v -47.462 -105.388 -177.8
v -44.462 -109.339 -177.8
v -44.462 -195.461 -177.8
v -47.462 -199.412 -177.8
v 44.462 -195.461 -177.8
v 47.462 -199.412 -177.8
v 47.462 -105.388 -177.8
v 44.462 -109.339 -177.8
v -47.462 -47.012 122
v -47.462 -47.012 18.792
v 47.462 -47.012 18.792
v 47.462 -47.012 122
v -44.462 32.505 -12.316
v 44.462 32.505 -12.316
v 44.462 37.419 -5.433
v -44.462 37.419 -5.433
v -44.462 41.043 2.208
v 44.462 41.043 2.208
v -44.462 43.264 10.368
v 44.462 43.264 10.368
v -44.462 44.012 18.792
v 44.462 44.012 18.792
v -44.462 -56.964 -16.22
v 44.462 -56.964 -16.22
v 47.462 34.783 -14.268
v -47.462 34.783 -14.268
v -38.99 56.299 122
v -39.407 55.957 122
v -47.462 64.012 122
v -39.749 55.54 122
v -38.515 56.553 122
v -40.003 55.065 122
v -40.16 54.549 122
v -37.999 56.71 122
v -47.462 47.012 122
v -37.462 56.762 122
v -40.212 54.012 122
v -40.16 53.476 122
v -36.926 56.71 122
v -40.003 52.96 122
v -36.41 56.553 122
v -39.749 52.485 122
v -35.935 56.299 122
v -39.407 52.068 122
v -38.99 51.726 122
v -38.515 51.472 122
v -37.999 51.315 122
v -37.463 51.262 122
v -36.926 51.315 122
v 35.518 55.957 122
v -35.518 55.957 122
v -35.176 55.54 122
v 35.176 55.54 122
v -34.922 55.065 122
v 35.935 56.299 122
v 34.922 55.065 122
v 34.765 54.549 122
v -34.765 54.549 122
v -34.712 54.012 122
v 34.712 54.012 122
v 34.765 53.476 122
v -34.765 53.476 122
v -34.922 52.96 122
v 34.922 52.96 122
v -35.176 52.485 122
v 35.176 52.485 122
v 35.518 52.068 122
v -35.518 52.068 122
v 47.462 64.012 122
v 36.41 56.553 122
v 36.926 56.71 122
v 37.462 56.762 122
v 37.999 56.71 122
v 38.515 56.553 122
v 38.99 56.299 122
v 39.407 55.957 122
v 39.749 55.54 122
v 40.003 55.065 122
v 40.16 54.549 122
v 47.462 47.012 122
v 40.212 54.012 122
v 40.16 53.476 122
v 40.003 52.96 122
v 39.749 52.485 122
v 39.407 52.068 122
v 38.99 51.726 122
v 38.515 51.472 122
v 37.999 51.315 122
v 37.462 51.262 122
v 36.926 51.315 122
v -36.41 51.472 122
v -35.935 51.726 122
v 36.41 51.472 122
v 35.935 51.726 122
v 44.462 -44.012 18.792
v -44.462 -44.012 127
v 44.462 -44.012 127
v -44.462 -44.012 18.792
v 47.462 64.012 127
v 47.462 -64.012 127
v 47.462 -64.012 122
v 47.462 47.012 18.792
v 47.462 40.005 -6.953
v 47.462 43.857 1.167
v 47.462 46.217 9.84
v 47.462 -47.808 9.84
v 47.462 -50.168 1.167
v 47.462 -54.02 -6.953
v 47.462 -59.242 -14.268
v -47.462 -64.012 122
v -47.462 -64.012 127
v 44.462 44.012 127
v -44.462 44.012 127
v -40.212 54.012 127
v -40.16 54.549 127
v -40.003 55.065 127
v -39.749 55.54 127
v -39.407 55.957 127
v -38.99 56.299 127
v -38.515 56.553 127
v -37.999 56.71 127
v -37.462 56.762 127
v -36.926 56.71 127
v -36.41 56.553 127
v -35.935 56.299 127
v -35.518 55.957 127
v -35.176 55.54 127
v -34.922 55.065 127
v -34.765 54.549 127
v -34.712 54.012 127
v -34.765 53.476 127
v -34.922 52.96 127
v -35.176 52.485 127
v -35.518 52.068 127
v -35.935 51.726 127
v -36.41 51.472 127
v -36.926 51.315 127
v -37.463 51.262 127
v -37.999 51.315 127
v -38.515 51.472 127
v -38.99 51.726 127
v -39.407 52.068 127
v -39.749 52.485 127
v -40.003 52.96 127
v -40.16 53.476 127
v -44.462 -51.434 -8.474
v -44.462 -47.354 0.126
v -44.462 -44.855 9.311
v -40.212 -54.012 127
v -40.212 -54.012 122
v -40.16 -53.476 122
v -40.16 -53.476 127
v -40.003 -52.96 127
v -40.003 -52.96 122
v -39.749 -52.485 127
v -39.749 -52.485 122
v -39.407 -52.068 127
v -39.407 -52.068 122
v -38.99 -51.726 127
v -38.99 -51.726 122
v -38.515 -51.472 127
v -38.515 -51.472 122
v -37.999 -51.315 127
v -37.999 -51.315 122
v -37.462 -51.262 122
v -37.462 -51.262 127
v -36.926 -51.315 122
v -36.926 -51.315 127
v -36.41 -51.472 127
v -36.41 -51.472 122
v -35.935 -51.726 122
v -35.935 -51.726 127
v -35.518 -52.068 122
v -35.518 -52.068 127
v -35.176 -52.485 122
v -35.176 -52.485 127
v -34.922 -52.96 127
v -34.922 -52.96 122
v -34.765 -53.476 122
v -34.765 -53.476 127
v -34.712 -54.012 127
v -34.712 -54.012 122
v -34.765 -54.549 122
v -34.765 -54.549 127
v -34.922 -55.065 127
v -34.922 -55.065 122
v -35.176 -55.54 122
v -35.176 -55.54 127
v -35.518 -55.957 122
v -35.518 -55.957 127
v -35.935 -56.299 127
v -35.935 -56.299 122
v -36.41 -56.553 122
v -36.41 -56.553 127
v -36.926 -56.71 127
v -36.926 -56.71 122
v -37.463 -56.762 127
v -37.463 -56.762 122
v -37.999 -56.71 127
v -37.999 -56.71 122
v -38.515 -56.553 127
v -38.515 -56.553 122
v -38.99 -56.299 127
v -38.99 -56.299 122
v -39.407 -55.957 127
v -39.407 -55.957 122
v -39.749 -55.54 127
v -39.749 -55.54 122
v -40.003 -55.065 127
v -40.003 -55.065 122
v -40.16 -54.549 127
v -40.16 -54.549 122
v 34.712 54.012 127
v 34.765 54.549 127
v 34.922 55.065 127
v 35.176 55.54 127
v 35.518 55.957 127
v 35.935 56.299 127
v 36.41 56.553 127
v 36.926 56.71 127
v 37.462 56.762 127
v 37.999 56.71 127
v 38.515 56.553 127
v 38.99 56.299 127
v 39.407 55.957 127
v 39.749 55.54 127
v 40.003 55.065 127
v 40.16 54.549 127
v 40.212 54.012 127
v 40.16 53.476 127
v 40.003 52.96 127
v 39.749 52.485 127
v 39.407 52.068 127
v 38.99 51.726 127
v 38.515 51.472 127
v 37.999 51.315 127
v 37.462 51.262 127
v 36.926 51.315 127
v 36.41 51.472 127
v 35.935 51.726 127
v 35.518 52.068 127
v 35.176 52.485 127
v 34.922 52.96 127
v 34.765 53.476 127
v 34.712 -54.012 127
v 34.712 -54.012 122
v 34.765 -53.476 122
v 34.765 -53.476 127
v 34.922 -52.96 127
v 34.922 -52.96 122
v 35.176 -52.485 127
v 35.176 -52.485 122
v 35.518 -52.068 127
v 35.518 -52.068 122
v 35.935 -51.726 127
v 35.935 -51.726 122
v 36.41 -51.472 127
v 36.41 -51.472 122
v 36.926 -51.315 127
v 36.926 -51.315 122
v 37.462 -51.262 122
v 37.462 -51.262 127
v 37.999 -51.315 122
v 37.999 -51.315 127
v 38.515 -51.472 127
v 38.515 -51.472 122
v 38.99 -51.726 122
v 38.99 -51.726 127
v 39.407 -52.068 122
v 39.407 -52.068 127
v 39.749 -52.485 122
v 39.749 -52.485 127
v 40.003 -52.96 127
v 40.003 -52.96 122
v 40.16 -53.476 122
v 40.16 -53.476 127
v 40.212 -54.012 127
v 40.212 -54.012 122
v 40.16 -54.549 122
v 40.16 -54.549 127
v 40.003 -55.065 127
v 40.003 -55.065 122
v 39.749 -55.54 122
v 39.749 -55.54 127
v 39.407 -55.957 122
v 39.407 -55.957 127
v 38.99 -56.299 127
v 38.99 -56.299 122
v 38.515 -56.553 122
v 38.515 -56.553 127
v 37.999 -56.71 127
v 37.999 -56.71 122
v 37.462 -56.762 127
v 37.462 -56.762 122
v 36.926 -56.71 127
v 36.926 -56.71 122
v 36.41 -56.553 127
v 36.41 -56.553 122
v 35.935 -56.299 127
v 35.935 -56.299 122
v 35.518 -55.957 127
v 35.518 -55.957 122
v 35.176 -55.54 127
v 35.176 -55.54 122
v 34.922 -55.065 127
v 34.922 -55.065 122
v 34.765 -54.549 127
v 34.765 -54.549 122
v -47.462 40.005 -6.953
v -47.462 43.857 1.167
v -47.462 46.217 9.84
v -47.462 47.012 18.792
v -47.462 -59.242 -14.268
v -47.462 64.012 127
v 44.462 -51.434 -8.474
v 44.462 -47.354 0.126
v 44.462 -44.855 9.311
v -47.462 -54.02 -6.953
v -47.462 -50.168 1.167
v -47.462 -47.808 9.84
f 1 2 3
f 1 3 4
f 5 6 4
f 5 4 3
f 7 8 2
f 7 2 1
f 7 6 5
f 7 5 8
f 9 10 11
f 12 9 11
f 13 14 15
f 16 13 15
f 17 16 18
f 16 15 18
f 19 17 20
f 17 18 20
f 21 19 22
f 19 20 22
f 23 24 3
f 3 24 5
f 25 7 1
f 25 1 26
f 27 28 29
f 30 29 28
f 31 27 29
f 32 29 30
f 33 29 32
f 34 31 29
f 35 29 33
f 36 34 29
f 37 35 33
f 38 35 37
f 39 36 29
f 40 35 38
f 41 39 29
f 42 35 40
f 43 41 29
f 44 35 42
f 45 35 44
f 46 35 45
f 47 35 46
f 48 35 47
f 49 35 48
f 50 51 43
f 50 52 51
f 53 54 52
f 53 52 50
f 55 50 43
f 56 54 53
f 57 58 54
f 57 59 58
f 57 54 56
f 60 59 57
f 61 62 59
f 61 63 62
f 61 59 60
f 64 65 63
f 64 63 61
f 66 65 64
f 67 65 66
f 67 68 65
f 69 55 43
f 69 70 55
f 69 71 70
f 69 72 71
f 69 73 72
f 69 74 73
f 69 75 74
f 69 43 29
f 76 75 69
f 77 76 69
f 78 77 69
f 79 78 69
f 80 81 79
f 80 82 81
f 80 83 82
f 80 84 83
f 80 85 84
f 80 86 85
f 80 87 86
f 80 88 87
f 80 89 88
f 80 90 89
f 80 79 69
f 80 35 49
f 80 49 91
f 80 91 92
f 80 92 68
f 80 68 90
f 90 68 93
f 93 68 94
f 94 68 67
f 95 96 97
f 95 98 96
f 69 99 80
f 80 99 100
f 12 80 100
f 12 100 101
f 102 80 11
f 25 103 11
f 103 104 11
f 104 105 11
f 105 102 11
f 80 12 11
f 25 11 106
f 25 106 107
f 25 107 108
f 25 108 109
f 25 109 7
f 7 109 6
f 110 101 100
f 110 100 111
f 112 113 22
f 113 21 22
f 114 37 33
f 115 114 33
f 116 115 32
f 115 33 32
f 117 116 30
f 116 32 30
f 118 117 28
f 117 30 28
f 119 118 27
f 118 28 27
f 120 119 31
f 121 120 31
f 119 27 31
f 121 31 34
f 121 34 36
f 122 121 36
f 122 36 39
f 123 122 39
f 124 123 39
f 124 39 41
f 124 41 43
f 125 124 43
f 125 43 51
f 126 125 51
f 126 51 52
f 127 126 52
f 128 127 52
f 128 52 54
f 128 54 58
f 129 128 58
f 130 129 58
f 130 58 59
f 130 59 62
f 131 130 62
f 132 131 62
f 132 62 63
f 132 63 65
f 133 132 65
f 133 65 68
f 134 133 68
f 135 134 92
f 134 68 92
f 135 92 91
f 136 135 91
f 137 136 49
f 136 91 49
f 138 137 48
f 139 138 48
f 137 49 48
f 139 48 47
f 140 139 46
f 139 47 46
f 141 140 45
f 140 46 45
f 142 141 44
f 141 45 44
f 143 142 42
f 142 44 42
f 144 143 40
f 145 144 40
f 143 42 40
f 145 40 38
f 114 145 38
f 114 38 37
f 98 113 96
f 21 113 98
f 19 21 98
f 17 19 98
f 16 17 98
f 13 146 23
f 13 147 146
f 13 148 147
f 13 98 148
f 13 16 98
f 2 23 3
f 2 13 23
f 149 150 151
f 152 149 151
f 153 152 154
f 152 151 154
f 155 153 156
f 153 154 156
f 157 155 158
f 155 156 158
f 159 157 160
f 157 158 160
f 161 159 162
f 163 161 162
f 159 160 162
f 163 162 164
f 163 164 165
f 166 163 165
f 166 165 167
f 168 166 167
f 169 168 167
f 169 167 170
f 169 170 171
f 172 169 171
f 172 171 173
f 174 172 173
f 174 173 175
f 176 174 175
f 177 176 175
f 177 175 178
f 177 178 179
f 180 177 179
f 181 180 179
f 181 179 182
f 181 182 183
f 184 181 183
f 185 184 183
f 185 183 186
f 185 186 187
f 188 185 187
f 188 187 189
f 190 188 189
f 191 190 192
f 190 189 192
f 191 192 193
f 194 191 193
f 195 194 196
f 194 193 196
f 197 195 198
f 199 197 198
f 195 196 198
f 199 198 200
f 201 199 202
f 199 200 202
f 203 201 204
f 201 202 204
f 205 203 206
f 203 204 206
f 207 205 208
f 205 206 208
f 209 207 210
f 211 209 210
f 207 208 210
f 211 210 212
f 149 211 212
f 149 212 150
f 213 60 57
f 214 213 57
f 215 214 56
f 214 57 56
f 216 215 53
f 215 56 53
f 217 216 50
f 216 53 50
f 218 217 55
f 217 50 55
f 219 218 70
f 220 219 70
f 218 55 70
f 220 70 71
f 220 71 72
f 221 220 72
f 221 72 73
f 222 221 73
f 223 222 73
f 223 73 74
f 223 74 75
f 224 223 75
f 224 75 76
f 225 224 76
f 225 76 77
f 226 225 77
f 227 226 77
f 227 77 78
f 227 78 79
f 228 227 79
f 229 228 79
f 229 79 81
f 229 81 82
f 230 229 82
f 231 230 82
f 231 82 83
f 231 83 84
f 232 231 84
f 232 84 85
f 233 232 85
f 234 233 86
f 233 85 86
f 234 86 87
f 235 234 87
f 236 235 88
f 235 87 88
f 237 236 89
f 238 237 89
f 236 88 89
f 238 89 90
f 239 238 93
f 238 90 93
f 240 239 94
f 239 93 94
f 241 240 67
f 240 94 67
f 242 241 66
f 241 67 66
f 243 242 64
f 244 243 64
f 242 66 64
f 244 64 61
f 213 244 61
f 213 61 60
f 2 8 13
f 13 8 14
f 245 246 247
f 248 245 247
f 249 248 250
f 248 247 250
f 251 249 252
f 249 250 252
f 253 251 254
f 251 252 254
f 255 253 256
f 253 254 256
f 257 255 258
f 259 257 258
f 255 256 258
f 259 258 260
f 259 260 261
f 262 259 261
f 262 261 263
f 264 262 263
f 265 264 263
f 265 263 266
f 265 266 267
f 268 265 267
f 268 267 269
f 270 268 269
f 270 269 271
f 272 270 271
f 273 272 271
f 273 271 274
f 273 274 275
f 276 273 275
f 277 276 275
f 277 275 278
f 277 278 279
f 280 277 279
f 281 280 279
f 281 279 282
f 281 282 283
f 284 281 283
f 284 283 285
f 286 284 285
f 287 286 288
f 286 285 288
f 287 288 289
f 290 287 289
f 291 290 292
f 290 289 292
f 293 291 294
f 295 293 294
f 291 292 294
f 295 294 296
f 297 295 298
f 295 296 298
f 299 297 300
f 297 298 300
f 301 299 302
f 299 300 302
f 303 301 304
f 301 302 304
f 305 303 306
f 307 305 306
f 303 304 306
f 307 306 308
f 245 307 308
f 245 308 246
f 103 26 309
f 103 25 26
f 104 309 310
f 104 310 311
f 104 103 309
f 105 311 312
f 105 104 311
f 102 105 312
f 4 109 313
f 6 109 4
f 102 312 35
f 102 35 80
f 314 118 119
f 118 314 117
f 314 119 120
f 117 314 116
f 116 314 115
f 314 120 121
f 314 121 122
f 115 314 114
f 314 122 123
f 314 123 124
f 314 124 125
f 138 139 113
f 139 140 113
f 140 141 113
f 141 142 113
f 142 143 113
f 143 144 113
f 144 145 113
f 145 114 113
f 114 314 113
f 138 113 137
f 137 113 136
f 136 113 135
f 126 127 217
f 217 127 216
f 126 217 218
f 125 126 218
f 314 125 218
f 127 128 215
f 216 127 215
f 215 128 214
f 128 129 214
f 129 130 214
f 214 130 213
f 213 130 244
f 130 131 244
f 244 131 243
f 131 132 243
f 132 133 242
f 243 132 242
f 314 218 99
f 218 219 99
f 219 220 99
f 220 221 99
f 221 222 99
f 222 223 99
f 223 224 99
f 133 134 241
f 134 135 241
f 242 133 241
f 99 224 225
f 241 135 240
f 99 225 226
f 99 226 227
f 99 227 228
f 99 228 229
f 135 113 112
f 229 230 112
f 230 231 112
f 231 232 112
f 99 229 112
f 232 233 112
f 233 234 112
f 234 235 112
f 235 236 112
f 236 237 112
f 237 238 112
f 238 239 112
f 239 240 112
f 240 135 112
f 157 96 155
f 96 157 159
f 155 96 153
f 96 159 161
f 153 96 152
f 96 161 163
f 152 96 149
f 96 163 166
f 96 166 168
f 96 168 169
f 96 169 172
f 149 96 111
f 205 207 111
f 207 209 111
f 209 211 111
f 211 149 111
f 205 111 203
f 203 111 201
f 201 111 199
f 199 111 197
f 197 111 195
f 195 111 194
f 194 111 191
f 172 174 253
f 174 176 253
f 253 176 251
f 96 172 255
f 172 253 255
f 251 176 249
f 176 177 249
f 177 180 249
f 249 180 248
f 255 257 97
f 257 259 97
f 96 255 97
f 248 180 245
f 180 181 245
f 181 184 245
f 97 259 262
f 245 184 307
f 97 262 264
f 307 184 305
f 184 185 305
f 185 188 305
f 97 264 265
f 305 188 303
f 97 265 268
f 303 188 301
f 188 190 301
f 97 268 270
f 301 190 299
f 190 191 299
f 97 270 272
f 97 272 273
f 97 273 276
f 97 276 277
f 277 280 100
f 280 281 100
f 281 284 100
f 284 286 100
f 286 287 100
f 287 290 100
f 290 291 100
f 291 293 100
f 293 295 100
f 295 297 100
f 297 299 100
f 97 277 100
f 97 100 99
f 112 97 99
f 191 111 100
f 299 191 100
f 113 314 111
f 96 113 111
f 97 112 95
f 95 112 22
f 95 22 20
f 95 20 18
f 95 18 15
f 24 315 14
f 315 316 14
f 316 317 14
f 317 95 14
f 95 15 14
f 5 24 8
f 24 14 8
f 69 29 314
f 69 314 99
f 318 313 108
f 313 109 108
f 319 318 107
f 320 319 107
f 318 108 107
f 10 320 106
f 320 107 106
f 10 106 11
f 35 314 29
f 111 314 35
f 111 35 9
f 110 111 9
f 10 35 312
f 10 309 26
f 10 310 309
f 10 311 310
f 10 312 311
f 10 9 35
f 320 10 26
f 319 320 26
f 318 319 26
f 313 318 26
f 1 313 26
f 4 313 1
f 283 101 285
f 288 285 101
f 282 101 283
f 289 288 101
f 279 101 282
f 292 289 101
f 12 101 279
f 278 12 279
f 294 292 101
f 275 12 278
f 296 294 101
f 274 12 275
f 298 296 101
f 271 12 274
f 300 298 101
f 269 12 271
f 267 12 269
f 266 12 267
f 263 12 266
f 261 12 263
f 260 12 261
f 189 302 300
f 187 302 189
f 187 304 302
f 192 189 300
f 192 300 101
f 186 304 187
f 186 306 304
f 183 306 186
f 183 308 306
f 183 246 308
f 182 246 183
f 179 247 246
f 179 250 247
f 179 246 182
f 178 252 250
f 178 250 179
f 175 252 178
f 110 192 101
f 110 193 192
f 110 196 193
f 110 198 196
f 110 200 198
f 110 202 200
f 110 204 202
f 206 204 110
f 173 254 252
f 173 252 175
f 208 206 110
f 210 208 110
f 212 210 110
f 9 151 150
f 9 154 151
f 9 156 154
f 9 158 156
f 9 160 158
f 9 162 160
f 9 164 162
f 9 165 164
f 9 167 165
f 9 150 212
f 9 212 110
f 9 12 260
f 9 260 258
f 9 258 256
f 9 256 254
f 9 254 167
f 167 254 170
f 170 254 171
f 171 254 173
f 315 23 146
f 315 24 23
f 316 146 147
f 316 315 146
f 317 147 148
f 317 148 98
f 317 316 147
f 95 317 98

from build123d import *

# Parameters (mm, degrees)
SKETCH1_W           = 94.925
SKETCH1_H           = 94.024999972
BOSS_EXTRUDE1_DEPTH = 127
BOSS_EXTRUDE2_DEPTH = 94.925
FILLET1_R           = 50.8
SHELL1_T            = -3
SKETCH3_W           = 94.925
SKETCH3_H           = 5
BOSS_EXTRUDE3_DEPTH = 16.999999878
SKETCH4_W           = 94.925
SKETCH4_H           = 5
BOSS_EXTRUDE4_DEPTH = 16.999999878
CUT_EXTRUDE1_REACH  = 365.178
SKETCH5_R           = 2.75


with BuildPart() as part:
    # Sketch1 → Boss-Extrude1 (new body)
    with BuildSketch(Plane.XY):
        Rectangle(SKETCH1_W, SKETCH1_H)
    extrude(amount=BOSS_EXTRUDE1_DEPTH)

    # Sketch2 → Boss-Extrude2 (add)
    with BuildSketch(Plane(origin=(47.4625, 0, 0), x_dir=(0, 0, -1), z_dir=(1, 0, 0))):
        Polygon((0, -47.012499986), (177.8, -199.412499986), (177.8, -105.387500014), (0, 47.012499986), align=None)
    extrude(amount=-BOSS_EXTRUDE2_DEPTH)

    # Fillet1
    fillet1_edges = [part.edges().sort_by_distance(p)[0] for p in [
        (0, -47.012499986, 0),
        (0, 47.012499986, 0),
    ]]
    fillet(fillet1_edges, radius=FILLET1_R)

    # Shell1
    shell1_openings = [part.faces().sort_by_distance(p)[0] for p in [
        (0, 0, 127),
        (0, -152.4, -177.8),
    ]]
    offset(amount=SHELL1_T, openings=shell1_openings, kind=Kind.INTERSECTION)

    # Sketch3 → Boss-Extrude3 (add)
    with BuildSketch(Plane(origin=(0, -47.012499986, 0), x_dir=(-1, 0, 0), z_dir=(0, -1, 0))):
        with Locations((0, -124.5)):
            Rectangle(SKETCH3_W, SKETCH3_H)
    extrude(amount=BOSS_EXTRUDE3_DEPTH)

    # Sketch4 → Boss-Extrude4 (add)
    with BuildSketch(Plane(origin=(0, 47.012499986, 0), x_dir=(1, 0, 0), z_dir=(0, 1, 0))):
        with Locations((0, -124.5)):
            Rectangle(SKETCH4_W, SKETCH4_H)
    extrude(amount=BOSS_EXTRUDE4_DEPTH)

    # Sketch5 → Cut-Extrude1 (cut, up to next)
    with BuildSketch(Plane(origin=(0, 0, 122), x_dir=(-1, 0, 0), z_dir=(0, 0, -1)), mode=Mode.PRIVATE) as cut_extrude1_sk1:
        with Locations((37.4625, 54.012499864)):
            Circle(SKETCH5_R)
    cut_extrude1_tool1 = extrude(cut_extrude1_sk1.sketch, amount=-CUT_EXTRUDE1_REACH, mode=Mode.PRIVATE) & part.part
    # Sketch5 → Cut-Extrude1 (cut, up to next)
    with BuildSketch(Plane(origin=(0, 0, 122), x_dir=(-1, 0, 0), z_dir=(0, 0, -1)), mode=Mode.PRIVATE) as cut_extrude1_sk2:
        with Locations((-37.4625, 54.012499864)):
            Circle(SKETCH5_R)
    cut_extrude1_tool2 = extrude(cut_extrude1_sk2.sketch, amount=-CUT_EXTRUDE1_REACH, mode=Mode.PRIVATE) & part.part
    # Sketch5 → Cut-Extrude1 (cut, up to next)
    with BuildSketch(Plane(origin=(0, 0, 122), x_dir=(-1, 0, 0), z_dir=(0, 0, -1)), mode=Mode.PRIVATE) as cut_extrude1_sk3:
        with Locations((37.4625, -54.012499864)):
            Circle(SKETCH5_R)
    cut_extrude1_tool3 = extrude(cut_extrude1_sk3.sketch, amount=-CUT_EXTRUDE1_REACH, mode=Mode.PRIVATE) & part.part
    # Sketch5 → Cut-Extrude1 (cut, up to next)
    with BuildSketch(Plane(origin=(0, 0, 122), x_dir=(-1, 0, 0), z_dir=(0, 0, -1)), mode=Mode.PRIVATE) as cut_extrude1_sk4:
        with Locations((-37.4625, -54.012499864)):
            Circle(SKETCH5_R)
    cut_extrude1_tool4 = extrude(cut_extrude1_sk4.sketch, amount=-CUT_EXTRUDE1_REACH, mode=Mode.PRIVATE) & part.part
    add(cut_extrude1_tool1.solids().sort_by_distance((-37.4625, 54.0125, 122))[0], mode=Mode.SUBTRACT)
    add(cut_extrude1_tool2.solids().sort_by_distance((37.4625, 54.0125, 122))[0], mode=Mode.SUBTRACT)
    add(cut_extrude1_tool3.solids().sort_by_distance((-37.4625, -54.0125, 122))[0], mode=Mode.SUBTRACT)
    add(cut_extrude1_tool4.solids().sort_by_distance((37.4625, -54.0125, 122))[0], mode=Mode.SUBTRACT)


solid = part.part
